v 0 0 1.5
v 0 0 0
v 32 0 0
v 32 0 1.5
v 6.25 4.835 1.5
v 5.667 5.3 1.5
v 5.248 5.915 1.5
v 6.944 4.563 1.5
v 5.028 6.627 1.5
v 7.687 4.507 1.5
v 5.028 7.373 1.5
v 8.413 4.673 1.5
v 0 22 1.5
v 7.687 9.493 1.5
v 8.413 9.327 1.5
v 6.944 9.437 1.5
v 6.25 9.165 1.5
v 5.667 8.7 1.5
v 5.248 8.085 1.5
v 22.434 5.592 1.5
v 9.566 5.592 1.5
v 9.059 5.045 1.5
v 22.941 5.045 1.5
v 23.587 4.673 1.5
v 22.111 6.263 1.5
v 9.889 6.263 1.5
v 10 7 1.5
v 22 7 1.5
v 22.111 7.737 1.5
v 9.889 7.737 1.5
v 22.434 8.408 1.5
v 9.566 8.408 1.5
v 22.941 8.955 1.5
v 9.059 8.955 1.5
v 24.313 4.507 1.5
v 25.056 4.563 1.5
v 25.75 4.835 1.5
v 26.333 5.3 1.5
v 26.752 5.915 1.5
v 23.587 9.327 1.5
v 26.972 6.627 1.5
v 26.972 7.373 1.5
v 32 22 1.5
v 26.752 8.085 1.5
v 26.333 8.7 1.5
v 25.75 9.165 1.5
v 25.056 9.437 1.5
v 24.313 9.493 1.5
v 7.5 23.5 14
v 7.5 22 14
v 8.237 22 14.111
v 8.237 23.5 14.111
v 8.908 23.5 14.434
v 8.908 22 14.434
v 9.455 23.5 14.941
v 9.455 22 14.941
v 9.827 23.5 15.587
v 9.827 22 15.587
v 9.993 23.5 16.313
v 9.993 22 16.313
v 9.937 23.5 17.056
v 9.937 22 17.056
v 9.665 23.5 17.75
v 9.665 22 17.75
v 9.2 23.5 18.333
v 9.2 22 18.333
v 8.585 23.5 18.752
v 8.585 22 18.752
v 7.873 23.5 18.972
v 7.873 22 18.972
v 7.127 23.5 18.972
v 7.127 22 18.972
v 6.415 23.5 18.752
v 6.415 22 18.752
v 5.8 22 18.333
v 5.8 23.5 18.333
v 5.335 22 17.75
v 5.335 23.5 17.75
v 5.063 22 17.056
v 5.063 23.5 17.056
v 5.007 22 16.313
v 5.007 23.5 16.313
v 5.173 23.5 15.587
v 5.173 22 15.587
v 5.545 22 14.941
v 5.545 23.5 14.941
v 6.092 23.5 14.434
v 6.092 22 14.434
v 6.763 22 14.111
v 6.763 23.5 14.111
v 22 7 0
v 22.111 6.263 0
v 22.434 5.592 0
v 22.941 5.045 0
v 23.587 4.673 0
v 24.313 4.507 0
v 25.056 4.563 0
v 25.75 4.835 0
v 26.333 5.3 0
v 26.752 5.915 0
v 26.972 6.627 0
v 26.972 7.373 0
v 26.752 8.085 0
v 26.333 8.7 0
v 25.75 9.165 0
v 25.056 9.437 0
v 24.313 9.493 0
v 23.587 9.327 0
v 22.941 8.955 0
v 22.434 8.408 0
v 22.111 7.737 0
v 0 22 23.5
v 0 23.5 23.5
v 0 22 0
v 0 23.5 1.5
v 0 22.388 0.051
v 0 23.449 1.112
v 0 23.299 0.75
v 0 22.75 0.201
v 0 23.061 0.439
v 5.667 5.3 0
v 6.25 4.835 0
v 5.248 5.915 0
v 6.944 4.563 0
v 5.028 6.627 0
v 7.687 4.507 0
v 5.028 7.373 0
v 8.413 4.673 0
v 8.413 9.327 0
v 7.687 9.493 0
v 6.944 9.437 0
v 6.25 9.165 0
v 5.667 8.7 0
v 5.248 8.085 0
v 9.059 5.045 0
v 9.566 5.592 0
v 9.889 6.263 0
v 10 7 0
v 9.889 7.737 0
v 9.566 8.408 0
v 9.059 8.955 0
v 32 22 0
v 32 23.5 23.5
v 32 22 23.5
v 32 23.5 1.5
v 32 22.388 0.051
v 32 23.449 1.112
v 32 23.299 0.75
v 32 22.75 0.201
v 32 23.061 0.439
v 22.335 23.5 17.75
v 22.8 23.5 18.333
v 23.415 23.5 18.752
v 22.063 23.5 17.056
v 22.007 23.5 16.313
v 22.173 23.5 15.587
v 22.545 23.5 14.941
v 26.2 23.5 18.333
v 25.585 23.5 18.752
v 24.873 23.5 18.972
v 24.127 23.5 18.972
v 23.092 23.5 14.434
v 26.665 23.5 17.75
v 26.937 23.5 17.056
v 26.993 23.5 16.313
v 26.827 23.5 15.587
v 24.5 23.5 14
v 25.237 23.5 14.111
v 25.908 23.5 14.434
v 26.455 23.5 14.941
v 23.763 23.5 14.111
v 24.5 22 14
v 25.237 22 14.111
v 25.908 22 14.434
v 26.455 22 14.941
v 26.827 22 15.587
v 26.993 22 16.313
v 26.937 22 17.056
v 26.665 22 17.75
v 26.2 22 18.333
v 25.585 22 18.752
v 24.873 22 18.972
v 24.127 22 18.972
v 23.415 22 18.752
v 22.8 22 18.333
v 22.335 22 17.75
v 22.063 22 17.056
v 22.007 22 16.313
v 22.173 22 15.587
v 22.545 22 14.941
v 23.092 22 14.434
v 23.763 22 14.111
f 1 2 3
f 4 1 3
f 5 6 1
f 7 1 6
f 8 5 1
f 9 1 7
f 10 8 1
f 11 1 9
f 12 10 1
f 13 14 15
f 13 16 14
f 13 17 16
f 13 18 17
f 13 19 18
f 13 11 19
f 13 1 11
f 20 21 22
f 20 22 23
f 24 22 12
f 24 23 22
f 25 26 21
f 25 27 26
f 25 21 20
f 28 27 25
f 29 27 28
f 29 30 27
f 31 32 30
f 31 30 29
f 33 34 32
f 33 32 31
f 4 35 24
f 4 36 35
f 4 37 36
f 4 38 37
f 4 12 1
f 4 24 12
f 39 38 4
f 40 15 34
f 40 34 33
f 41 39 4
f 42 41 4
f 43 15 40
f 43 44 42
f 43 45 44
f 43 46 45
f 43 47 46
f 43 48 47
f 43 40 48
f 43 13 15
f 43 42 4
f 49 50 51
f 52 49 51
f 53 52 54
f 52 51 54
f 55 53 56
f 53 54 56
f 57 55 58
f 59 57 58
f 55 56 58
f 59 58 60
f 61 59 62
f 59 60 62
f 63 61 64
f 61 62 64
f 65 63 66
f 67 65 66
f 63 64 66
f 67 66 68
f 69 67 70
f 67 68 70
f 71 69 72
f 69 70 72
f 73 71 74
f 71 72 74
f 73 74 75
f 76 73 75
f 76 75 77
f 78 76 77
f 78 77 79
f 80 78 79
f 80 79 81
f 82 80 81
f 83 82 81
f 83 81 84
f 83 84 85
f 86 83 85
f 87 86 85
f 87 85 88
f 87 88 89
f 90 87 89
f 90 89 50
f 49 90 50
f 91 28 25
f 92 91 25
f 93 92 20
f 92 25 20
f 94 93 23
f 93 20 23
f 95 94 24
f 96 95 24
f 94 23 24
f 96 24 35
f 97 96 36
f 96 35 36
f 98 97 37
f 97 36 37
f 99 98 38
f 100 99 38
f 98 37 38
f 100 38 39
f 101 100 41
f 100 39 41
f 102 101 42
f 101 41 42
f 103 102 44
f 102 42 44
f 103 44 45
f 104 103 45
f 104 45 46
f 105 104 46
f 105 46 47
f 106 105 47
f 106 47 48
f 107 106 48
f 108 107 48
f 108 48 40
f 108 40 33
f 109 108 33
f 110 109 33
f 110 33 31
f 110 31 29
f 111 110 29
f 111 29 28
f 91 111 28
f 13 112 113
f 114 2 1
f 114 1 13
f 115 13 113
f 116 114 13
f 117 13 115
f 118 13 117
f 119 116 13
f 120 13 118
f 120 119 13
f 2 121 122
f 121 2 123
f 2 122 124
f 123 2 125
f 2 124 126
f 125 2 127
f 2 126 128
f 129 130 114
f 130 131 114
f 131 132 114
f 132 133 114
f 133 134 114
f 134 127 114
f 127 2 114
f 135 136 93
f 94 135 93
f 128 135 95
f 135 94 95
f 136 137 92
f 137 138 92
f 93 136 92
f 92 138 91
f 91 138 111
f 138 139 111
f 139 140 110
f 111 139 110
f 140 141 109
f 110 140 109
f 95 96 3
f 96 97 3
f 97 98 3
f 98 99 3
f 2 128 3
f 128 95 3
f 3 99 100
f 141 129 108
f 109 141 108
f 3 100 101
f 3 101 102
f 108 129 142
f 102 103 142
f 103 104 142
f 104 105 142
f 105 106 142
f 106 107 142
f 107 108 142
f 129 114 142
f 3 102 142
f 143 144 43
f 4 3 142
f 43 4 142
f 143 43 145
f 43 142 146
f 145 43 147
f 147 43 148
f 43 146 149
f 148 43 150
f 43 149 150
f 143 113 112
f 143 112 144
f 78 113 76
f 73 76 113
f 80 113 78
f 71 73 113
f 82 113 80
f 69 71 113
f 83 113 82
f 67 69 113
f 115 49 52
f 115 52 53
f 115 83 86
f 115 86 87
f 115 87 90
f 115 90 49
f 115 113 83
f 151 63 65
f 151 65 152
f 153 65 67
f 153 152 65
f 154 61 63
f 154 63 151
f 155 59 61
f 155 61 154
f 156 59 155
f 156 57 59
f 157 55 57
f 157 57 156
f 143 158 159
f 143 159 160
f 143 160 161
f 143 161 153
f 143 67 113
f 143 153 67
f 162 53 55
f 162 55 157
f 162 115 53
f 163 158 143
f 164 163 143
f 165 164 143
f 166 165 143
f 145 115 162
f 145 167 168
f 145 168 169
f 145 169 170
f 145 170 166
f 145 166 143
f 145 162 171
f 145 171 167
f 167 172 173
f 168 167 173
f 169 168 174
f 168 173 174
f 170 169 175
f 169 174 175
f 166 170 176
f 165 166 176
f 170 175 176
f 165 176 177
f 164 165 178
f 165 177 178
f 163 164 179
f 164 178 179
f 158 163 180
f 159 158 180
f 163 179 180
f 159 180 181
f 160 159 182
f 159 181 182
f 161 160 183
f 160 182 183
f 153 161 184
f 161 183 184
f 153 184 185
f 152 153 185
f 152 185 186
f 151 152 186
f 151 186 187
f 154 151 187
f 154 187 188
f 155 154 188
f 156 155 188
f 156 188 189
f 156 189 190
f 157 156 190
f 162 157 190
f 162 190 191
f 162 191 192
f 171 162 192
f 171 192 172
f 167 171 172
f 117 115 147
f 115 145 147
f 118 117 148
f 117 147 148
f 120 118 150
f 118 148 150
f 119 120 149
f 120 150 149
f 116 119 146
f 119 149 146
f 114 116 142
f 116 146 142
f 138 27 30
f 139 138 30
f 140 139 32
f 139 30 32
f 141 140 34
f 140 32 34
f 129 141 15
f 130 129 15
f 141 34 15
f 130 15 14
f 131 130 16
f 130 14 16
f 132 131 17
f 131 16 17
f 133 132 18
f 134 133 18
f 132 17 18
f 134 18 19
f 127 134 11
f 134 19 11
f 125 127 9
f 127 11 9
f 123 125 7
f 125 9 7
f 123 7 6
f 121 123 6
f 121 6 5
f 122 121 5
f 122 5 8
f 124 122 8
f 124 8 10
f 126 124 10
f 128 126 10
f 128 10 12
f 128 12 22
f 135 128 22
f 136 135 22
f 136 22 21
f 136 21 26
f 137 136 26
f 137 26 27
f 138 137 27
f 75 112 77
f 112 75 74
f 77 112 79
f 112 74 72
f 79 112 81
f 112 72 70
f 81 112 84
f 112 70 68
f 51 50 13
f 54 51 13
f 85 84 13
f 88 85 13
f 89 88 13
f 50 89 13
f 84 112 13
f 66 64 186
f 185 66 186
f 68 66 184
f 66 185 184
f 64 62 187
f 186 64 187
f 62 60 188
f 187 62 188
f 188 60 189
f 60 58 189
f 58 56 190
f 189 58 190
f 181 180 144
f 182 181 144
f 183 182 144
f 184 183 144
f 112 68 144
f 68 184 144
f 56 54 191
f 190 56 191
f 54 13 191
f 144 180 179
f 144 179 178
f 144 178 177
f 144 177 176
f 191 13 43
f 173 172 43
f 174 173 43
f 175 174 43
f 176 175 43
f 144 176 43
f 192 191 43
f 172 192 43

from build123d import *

# Parameters (mm, degrees)
SKETCH_1_W          = 32
SKETCH_1_H          = 23.5
EXTRUDE_2_DEPTH     = 23.5
SHELL_1_T           = -1.5
FILLET_2_R          = 1.5
SKETCH_3_R          = 2.5
CUT_EXTRUDE_2_DEPTH = 23.5
SKETCH_5_R          = 2.5
CUT_EXTRUDE_3_DEPTH = 23.5


with BuildPart() as part:
    # 草图1 → 凸台-拉伸2 (new body)
    with BuildSketch(Plane.XY):
        with Locations((16, 11.75)):
            Rectangle(SKETCH_1_W, SKETCH_1_H)
    extrude(amount=EXTRUDE_2_DEPTH)

    # 抽壳1
    shell_1_openings = [part.faces().sort_by_distance(p)[0] for p in [
        (16, 11.75, 23.5),
        (32, 11.75, 11.75),
        (16, 0, 11.75),
        (0, 11.75, 11.75),
    ]]
    offset(amount=SHELL_1_T, openings=shell_1_openings, kind=Kind.INTERSECTION)

    # 圆角2
    fillet_2_edges = [part.edges().sort_by_distance(p)[0] for p in [
        (16, 23.5, 0),
    ]]
    fillet(fillet_2_edges, radius=FILLET_2_R)

    # 草图3 → 切除-拉伸2 (cut)
    with BuildSketch(Plane.XY.offset(1.5)):
        with Locations((7.5, 7)):
            Circle(SKETCH_3_R)
        with Locations(Location((24.5, 7, 0), (0, 0, 180))):
            Circle(SKETCH_3_R)
    extrude(amount=-CUT_EXTRUDE_2_DEPTH, mode=Mode.SUBTRACT)

    # 草图5 → 切除-拉伸3 (cut)
    with BuildSketch(Plane.XZ.offset(-22)):
        with Locations(Location((7.5, 16.5, 0), (0, 0, 270))):
            Circle(SKETCH_5_R)
        with Locations(Location((24.5, 16.5, 0), (0, 0, 270))):
            Circle(SKETCH_5_R)
    extrude(amount=-CUT_EXTRUDE_3_DEPTH, mode=Mode.SUBTRACT)


solid = part.part
